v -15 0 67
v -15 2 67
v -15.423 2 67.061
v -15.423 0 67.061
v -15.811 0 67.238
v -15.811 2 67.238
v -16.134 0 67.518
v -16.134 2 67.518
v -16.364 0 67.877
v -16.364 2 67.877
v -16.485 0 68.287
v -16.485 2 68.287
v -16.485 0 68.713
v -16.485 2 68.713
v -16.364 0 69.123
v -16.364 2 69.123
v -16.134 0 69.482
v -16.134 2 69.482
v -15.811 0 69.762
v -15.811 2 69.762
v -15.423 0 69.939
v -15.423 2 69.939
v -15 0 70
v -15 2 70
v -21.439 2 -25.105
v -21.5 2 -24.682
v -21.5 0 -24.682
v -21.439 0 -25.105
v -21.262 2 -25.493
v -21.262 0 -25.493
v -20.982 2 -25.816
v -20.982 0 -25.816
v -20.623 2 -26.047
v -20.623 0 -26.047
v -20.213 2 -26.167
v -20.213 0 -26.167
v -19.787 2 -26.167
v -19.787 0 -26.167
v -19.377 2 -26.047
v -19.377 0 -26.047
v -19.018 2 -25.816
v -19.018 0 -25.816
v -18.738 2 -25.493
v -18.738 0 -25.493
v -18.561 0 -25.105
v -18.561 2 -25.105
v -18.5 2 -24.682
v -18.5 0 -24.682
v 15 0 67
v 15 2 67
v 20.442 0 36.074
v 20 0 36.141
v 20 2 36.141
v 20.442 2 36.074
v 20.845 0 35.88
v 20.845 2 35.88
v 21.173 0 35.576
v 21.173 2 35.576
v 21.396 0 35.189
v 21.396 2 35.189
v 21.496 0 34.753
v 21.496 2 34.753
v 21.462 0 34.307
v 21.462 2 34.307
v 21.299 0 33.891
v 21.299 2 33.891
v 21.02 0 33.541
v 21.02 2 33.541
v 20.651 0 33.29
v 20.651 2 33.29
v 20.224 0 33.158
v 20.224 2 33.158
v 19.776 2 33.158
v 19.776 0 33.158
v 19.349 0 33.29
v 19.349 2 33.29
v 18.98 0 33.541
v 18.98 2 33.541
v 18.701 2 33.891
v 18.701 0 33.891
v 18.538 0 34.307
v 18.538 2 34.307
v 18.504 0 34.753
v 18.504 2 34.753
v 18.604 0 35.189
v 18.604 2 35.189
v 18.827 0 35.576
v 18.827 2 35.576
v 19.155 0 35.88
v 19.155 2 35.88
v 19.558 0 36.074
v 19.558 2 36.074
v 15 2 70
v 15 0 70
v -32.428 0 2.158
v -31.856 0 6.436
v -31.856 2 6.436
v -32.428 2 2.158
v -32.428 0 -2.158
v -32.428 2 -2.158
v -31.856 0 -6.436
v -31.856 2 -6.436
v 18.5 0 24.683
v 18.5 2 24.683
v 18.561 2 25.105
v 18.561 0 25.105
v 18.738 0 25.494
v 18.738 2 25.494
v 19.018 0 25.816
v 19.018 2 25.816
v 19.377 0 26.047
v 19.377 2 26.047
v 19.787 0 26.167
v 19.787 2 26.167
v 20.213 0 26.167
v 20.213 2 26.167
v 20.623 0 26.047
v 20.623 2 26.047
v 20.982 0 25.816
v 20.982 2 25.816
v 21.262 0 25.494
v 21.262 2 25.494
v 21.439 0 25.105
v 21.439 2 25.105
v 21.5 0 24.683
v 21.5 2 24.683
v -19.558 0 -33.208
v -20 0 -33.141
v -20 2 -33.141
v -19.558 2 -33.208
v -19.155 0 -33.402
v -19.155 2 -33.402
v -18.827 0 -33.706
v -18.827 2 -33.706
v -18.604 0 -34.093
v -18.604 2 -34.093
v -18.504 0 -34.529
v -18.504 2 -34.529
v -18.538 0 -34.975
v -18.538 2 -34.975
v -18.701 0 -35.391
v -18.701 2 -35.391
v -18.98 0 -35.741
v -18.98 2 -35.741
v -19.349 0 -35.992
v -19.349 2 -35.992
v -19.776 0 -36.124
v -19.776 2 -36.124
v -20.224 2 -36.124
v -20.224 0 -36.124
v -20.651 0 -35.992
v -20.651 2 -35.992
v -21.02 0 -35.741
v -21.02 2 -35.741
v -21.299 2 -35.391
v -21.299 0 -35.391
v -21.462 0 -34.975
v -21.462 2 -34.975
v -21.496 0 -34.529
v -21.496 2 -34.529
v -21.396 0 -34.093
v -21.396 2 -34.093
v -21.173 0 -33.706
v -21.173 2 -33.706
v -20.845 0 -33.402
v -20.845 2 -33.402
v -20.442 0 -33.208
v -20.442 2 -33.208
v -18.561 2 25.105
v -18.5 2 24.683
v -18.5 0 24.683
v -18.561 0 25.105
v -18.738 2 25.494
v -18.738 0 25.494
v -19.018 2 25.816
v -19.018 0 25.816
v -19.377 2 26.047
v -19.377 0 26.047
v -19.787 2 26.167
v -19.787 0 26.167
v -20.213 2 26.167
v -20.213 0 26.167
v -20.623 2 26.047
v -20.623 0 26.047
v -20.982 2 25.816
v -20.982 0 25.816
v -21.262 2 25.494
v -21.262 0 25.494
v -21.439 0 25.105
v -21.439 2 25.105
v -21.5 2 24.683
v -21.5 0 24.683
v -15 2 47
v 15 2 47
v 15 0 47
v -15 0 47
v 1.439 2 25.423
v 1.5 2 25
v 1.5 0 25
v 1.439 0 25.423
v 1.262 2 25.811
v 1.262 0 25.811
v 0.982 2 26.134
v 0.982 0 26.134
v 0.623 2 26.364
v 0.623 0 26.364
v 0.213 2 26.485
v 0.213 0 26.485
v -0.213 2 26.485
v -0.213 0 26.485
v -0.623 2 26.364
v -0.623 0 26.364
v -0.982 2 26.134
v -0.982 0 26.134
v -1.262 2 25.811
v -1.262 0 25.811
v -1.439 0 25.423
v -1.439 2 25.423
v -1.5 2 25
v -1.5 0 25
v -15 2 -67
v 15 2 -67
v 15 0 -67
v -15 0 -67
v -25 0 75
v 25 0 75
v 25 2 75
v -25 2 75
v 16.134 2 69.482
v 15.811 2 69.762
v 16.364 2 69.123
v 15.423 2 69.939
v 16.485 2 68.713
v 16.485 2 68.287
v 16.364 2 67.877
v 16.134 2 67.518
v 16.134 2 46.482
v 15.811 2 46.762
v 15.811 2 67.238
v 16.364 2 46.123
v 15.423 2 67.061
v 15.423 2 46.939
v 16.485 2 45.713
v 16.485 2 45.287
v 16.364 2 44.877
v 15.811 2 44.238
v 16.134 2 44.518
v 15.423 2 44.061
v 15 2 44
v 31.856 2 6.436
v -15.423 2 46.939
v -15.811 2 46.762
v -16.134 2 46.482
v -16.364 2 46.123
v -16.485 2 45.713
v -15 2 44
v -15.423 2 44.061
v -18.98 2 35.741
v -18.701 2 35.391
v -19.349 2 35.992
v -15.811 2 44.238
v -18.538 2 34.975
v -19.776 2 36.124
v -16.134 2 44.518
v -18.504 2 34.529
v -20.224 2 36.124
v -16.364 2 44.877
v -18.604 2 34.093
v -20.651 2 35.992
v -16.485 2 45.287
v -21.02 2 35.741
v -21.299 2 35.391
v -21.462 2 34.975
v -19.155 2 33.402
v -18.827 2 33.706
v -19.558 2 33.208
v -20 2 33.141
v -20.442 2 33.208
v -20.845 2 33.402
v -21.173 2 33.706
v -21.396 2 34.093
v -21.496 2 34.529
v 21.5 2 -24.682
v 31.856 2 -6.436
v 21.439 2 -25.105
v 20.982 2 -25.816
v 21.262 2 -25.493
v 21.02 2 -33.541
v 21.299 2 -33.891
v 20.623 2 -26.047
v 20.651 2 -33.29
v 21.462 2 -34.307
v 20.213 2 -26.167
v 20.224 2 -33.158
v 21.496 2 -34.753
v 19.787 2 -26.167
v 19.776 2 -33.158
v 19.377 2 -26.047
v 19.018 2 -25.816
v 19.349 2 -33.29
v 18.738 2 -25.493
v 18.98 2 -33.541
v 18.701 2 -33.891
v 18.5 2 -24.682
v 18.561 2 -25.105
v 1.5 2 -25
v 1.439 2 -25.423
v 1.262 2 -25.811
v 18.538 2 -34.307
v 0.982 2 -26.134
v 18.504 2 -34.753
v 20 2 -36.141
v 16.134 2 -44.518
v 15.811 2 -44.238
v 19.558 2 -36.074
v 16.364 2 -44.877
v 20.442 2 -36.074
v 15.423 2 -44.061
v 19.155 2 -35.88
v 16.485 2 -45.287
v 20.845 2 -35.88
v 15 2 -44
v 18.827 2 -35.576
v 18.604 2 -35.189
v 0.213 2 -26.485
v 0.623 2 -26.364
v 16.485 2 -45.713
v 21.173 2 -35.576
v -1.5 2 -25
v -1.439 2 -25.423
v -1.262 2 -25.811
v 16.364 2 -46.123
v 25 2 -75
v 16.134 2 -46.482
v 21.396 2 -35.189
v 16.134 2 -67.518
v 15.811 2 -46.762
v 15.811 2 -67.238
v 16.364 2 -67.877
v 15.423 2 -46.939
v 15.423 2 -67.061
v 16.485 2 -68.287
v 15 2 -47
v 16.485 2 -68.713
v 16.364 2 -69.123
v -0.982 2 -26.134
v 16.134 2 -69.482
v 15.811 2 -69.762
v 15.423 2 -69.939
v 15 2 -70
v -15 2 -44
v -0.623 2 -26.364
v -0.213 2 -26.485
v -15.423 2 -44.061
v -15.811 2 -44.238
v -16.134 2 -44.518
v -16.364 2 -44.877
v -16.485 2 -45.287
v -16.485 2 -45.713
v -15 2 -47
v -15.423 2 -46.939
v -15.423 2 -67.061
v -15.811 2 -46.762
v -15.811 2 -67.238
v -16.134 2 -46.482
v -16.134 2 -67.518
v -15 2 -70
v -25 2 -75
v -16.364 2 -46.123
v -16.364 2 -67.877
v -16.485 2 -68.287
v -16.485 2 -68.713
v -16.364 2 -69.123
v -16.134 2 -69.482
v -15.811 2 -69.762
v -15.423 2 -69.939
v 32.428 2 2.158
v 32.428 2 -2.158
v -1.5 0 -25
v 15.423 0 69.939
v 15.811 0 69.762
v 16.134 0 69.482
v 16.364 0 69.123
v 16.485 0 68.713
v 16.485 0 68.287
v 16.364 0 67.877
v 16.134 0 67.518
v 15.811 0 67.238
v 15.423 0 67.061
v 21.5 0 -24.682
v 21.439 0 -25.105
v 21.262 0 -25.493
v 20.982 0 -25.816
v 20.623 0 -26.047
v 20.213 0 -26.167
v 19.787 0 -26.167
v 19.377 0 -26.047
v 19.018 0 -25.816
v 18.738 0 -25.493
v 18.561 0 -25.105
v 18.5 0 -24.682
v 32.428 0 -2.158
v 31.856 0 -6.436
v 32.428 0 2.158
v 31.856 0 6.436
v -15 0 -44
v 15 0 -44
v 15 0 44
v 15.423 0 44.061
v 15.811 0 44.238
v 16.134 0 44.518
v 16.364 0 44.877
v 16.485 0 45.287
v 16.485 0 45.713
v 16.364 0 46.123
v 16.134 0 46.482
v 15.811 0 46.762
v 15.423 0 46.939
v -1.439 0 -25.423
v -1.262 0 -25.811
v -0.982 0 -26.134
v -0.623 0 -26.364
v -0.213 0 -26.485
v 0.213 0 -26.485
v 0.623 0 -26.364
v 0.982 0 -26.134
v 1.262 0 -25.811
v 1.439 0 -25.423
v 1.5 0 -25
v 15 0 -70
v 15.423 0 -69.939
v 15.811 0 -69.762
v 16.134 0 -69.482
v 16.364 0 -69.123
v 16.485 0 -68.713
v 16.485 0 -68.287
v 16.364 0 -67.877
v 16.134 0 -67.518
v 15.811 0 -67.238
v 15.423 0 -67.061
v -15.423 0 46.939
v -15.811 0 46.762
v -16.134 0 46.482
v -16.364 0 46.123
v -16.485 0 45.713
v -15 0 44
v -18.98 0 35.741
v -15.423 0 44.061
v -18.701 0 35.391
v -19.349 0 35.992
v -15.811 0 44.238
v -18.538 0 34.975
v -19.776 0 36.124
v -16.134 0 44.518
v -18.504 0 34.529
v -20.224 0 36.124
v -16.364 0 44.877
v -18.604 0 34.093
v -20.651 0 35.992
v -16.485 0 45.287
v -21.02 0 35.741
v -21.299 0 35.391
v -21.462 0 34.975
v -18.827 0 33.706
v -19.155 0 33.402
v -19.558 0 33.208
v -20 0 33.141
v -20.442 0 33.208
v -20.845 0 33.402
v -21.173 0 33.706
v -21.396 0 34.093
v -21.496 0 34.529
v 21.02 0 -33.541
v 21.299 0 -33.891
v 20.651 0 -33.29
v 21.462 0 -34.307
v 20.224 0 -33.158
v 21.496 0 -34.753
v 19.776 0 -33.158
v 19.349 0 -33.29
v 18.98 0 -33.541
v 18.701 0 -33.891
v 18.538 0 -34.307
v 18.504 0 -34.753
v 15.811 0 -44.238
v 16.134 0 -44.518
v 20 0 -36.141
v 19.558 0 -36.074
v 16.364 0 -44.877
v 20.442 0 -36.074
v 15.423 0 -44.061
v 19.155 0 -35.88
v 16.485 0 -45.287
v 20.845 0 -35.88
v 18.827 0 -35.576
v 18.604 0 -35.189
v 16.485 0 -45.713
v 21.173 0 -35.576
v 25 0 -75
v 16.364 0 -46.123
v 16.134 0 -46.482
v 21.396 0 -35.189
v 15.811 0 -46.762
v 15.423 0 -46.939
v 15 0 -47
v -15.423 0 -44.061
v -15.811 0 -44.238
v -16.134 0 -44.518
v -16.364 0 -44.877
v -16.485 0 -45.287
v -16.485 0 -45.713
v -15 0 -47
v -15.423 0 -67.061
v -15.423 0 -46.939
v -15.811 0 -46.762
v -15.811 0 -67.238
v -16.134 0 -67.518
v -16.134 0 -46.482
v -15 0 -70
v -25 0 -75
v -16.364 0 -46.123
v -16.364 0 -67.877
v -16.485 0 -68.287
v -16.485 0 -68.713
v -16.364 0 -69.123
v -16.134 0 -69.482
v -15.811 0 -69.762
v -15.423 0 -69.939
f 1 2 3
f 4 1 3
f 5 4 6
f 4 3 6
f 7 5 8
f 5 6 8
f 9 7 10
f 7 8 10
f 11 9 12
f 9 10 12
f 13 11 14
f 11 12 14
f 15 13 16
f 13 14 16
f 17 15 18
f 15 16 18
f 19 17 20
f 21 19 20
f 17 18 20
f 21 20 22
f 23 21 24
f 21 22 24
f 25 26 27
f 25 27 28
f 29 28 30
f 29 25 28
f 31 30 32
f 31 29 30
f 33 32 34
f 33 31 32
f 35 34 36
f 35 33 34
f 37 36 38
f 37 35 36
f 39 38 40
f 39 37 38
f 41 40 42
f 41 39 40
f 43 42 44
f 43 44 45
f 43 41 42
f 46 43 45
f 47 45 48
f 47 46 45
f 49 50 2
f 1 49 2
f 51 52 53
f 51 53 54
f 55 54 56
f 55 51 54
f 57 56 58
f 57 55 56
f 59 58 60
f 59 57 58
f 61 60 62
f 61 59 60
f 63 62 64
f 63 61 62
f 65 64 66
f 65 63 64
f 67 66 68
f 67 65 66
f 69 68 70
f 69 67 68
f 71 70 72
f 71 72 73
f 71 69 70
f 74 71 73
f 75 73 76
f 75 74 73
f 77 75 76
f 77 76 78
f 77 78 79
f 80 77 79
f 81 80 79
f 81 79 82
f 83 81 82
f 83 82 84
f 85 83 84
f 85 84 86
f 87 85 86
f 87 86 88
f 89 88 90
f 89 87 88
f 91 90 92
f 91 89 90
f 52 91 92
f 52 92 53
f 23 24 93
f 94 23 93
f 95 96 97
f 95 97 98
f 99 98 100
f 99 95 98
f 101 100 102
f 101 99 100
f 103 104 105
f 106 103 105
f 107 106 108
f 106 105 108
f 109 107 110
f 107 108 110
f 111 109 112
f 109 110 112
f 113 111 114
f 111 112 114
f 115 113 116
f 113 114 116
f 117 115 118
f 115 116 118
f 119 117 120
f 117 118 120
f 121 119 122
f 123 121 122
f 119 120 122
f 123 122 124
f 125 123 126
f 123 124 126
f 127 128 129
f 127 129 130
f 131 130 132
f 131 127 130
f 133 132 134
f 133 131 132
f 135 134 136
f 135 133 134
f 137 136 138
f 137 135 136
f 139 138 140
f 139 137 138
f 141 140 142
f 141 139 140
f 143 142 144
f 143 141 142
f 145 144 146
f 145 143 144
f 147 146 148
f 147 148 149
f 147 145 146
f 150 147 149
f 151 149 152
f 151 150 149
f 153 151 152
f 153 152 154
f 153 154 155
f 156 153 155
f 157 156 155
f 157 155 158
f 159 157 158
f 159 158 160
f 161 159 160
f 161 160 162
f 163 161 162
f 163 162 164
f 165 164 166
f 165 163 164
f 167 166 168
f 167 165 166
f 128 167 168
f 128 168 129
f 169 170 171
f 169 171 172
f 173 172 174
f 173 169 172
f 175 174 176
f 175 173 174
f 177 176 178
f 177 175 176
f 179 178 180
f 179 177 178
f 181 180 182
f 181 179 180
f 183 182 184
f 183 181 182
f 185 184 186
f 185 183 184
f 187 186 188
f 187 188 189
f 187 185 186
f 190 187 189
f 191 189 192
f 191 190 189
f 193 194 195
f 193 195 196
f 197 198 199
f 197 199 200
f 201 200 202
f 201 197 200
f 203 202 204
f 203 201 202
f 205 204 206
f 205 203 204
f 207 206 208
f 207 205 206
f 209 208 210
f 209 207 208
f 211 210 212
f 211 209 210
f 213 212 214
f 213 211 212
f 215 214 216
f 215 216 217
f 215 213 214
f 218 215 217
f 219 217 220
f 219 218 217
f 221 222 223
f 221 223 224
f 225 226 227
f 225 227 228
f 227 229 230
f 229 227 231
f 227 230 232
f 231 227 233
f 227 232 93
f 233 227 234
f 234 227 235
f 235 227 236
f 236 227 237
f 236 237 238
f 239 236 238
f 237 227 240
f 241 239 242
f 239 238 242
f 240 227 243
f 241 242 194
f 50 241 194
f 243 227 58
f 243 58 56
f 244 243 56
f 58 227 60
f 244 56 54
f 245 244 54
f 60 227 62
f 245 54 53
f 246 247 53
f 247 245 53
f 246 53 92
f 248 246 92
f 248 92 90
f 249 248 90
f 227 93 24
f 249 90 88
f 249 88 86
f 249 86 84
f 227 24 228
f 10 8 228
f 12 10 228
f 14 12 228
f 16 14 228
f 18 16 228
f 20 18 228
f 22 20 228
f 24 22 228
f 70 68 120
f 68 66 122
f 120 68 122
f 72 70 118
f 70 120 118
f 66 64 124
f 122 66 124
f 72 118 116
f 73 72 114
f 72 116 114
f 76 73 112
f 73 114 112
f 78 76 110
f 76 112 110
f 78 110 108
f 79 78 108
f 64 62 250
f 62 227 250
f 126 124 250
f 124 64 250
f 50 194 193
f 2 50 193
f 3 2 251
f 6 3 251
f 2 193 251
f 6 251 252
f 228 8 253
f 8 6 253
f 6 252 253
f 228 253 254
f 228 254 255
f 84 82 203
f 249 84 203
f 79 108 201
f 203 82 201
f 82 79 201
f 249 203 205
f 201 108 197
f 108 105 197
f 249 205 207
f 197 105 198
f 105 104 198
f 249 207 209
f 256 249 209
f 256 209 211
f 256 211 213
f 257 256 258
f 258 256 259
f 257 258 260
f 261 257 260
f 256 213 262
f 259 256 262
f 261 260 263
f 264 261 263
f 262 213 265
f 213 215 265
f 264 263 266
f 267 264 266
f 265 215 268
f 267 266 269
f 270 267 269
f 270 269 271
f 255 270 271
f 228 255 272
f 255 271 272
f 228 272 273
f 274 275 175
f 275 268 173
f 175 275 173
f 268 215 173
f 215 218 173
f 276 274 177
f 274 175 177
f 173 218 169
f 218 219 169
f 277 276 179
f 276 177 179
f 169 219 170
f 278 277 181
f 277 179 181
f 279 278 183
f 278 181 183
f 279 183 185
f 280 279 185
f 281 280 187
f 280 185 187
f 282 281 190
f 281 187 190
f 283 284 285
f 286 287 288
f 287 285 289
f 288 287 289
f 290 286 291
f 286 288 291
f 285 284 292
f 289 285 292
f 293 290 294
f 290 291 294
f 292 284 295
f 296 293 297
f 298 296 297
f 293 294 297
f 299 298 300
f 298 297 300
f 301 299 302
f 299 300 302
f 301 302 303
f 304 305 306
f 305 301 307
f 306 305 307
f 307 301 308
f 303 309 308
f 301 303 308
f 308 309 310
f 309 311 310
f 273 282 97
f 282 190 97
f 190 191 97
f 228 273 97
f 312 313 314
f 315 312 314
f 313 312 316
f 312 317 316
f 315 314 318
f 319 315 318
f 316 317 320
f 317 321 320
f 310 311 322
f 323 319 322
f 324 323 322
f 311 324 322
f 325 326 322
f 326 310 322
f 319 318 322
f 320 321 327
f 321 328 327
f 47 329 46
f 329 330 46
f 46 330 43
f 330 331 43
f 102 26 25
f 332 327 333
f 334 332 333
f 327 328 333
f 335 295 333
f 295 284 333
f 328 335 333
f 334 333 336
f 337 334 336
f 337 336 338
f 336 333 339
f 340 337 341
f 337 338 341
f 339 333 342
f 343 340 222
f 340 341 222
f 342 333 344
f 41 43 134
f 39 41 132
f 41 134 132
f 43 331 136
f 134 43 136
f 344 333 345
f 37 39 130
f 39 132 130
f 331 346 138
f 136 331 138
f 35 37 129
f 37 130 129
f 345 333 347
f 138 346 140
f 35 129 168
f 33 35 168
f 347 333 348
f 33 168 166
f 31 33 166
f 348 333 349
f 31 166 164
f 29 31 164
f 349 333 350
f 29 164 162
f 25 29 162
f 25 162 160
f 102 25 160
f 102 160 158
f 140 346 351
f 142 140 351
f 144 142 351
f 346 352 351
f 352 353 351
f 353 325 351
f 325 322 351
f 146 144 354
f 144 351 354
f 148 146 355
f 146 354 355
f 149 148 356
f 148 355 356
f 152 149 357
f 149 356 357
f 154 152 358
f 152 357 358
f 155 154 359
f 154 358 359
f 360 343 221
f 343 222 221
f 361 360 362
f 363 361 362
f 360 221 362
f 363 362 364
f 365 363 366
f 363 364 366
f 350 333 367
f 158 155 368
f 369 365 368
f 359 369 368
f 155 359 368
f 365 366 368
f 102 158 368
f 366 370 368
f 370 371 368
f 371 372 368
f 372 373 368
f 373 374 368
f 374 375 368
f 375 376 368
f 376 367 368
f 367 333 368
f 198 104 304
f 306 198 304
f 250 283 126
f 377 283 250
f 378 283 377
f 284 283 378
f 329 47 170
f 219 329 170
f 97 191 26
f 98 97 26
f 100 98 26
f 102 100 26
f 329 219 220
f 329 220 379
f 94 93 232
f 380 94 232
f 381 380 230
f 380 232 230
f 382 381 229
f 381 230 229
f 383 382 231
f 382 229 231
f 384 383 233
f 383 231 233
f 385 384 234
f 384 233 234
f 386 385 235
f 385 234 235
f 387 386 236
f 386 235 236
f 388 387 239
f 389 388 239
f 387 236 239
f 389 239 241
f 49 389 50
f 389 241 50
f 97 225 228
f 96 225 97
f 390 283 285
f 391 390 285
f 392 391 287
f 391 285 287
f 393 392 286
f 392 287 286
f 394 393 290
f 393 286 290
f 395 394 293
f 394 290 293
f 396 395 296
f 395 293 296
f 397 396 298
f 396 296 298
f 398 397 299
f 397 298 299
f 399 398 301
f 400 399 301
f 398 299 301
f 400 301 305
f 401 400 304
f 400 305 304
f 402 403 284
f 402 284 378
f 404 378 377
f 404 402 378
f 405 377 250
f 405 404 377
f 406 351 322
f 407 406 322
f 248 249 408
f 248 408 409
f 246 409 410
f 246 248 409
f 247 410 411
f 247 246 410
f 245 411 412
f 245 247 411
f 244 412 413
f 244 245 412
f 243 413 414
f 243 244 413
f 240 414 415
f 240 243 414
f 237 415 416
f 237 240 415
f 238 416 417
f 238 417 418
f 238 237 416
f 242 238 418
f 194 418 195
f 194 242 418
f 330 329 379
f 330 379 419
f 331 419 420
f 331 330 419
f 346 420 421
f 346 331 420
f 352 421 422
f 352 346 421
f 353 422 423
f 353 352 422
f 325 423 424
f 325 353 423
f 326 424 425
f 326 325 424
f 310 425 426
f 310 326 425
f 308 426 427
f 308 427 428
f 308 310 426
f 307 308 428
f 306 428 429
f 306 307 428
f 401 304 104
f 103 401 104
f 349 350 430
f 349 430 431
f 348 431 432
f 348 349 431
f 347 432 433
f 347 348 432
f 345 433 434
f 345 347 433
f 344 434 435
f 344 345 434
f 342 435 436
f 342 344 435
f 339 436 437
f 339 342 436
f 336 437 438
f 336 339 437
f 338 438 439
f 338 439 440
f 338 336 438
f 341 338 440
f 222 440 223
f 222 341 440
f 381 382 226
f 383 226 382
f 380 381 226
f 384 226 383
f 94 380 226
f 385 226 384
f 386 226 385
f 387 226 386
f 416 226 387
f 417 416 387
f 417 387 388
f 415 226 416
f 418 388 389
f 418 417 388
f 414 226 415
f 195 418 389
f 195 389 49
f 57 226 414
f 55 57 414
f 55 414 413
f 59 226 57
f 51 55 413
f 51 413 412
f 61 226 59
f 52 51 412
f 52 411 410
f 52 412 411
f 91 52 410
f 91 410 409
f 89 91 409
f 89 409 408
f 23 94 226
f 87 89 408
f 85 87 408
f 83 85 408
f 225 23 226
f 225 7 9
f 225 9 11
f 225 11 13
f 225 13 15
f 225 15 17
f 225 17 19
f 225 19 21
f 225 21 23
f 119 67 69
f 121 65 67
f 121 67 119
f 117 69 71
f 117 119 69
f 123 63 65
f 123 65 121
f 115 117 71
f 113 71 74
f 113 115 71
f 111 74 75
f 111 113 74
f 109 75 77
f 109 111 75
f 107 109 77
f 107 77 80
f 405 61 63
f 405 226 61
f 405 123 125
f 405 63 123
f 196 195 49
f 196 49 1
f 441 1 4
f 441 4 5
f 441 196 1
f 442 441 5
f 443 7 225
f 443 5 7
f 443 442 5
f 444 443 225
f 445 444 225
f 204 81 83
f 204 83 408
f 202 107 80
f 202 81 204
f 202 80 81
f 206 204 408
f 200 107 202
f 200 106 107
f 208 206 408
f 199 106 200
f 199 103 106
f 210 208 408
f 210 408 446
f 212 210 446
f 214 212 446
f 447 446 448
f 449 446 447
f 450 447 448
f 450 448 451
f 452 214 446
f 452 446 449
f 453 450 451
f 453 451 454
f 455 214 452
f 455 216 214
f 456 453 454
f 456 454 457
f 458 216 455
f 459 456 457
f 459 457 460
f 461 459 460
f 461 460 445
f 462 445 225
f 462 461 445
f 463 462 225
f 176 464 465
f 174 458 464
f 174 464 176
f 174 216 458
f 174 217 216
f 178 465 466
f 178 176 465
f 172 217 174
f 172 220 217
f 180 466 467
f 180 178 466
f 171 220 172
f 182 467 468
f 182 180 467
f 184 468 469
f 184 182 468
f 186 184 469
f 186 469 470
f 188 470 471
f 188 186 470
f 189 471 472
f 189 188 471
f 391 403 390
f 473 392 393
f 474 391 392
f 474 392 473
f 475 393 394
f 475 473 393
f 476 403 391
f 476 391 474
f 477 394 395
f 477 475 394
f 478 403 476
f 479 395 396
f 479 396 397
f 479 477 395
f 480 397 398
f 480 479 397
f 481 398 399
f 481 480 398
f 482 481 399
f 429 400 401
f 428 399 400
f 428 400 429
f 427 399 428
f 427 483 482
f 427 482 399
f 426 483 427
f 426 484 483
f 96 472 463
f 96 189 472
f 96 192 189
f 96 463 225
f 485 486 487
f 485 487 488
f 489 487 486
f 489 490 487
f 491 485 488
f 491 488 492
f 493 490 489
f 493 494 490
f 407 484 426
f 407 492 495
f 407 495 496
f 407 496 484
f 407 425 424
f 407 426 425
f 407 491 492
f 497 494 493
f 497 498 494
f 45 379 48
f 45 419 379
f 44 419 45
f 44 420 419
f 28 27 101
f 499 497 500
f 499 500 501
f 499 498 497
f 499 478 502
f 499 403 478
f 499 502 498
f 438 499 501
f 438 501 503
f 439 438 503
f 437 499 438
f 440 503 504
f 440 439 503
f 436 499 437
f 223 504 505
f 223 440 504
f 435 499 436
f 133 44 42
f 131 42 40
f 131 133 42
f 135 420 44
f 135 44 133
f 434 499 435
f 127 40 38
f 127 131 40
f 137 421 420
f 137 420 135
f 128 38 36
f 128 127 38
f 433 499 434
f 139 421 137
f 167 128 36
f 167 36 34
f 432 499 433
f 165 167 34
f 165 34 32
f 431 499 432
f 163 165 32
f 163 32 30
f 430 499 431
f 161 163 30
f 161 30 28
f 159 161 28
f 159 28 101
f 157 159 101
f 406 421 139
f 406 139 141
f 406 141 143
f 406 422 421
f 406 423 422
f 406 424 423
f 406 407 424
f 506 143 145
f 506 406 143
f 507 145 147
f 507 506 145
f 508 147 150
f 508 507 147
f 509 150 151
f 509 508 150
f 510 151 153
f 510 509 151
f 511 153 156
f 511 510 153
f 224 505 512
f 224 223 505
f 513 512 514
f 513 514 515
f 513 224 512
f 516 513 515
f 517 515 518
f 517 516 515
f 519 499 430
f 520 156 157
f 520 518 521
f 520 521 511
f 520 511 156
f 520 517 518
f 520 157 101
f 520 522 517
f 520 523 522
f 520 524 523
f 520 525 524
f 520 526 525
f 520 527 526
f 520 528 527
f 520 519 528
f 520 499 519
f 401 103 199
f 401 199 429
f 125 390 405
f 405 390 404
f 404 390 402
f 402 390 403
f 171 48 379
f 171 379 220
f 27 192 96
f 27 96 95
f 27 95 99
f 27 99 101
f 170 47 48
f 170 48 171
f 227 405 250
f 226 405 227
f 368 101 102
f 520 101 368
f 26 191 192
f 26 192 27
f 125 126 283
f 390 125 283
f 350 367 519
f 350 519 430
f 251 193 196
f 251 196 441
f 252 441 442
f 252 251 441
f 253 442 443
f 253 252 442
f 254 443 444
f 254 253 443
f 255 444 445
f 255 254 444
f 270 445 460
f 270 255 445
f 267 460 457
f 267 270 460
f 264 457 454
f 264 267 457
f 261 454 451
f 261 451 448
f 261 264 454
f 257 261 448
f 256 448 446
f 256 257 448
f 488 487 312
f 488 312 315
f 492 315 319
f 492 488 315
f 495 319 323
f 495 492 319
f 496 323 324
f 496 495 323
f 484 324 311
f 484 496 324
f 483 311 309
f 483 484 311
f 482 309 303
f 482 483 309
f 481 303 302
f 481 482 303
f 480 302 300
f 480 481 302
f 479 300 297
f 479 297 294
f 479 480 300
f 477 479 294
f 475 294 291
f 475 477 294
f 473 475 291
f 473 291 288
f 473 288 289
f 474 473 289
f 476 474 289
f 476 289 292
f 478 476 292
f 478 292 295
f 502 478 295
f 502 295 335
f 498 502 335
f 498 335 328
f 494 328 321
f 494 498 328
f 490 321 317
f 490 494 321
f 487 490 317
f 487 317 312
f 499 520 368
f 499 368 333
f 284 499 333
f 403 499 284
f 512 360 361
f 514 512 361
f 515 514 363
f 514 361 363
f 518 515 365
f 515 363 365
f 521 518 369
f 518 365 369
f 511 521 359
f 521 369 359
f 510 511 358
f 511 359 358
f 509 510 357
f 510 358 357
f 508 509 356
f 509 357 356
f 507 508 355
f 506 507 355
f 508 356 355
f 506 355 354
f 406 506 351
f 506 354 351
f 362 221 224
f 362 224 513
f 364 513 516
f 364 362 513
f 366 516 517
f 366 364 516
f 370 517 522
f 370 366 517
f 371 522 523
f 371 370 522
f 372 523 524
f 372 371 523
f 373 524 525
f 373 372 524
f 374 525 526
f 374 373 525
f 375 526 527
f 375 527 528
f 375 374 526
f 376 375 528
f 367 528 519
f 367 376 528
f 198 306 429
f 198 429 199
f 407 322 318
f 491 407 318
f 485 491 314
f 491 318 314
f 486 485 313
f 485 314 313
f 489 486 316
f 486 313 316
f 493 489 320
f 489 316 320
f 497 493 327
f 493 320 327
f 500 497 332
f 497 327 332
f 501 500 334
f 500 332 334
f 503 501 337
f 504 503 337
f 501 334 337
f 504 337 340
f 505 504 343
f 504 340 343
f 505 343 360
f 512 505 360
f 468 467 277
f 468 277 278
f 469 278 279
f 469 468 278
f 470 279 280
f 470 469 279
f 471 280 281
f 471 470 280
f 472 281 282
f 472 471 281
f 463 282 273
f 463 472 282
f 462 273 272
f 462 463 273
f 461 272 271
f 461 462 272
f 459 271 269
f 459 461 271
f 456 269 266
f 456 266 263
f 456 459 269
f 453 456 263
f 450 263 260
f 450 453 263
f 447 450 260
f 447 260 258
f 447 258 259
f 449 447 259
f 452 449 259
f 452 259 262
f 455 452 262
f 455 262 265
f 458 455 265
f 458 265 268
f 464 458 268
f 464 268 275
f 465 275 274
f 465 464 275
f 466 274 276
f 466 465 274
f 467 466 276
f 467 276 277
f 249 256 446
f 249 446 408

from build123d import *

# Parameters (mm, degrees)
SKETCH1_R           = 1.5
BOSS_EXTRUDE1_DEPTH = 2
CUT_EXTRUDE1_DEPTH  = 2


with BuildPart() as part:
    # Sketch1 → Boss-Extrude1 (new body)
    with BuildSketch(Plane(origin=(0, 0, 0), x_dir=(1, 0, 0), z_dir=(0, 1, 0))):
        with BuildLine():
            Line((-31.856435644, 6.435643564), (-25, 75))
            Line((-25, 75), (25, 75))
            Line((25, 75), (31.856435644, 6.435643564))
            ThreePointArc((31.856435644, 6.435643564), (32.5, 0), (31.856435644, -6.435643564))
            Line((31.856435644, -6.435643564), (25, -75))
            Line((25, -75), (-25, -75))
            Line((-25, -75), (-31.856435644, -6.435643564))
            ThreePointArc((-31.856435644, -6.435643564), (-32.5, 0), (-31.856435644, 6.435643564))
        make_face()
        with Locations(Location((-20, 34.641016151, 0), (0, 0, 270))):
            Circle(SKETCH1_R, mode=Mode.SUBTRACT)
        with Locations(Location((20, 34.641016151, 0), (0, 0, 90))):
            Circle(SKETCH1_R, mode=Mode.SUBTRACT)
        with Locations(Location((20, -34.641016151, 0), (0, 0, 270))):
            Circle(SKETCH1_R, mode=Mode.SUBTRACT)
        with Locations(Location((-20, -34.641016151, 0), (0, 0, 90))):
            Circle(SKETCH1_R, mode=Mode.SUBTRACT)
    extrude(amount=BOSS_EXTRUDE1_DEPTH)

    # Sketch2 → Cut-Extrude1 (cut)
    with BuildSketch(Plane(origin=(0, 2, 0), x_dir=(1, 0, 0), z_dir=(0, 1, 0))):
        with BuildLine():
            Line((-15, 70), (15, 70))
            ThreePointArc((15, 70), (16.5, 68.5), (15, 67))
            Line((15, 67), (-15, 67))
            ThreePointArc((-15, 67), (-16.5, 68.5), (-15, 70))
        make_face()
        with BuildLine():
            Line((-15, -70), (15, -70))
            ThreePointArc((15, -70), (16.5, -68.5), (15, -67))
            Line((15, -67), (-15, -67))
            ThreePointArc((-15, -67), (-16.5, -68.5), (-15, -70))
        make_face()
        with BuildLine():
            Line((-15, 44), (15, 44))
            ThreePointArc((15, 44), (16.5, 45.5), (15, 47))
            Line((15, 47), (-15, 47))
            ThreePointArc((-15, 47), (-16.5, 45.5), (-15, 44))
        make_face()
        with BuildLine():
            Line((-15, -44), (15, -44))
            ThreePointArc((15, -44), (16.5, -45.5), (15, -47))
            Line((15, -47), (-15, -47))
            ThreePointArc((-15, -47), (-16.5, -45.5), (-15, -44))
        make_face()
        with BuildLine():
            Line((-18.5, 24.682455481), (-18.5, -24.682555481))
            ThreePointArc((-18.5, -24.682555481), (-20, -26.182555481), (-21.5, -24.682555481))
            Line((-21.5, -24.682555481), (-21.5, 24.682455481))
            ThreePointArc((-21.5, 24.682455481), (-20, 26.182455481), (-18.5, 24.682455481))
        make_face()
        with BuildLine():
            Line((18.5, 24.682455481), (18.5, -24.682555481))
            ThreePointArc((18.5, -24.682555481), (20, -26.182555481), (21.5, -24.682555481))
            Line((21.5, -24.682555481), (21.5, 24.682455481))
            ThreePointArc((21.5, 24.682455481), (20, 26.182455481), (18.5, 24.682455481))
        make_face()
        with BuildLine():
            Line((1.5, 25), (1.5, -25))
            ThreePointArc((1.5, -25), (0, -26.5), (-1.5, -25))
            Line((-1.5, -25), (-1.5, 25))
            ThreePointArc((-1.5, 25), (0, 26.5), (1.5, 25))
        make_face()
    extrude(amount=-CUT_EXTRUDE1_DEPTH, mode=Mode.SUBTRACT)


solid = part.part
